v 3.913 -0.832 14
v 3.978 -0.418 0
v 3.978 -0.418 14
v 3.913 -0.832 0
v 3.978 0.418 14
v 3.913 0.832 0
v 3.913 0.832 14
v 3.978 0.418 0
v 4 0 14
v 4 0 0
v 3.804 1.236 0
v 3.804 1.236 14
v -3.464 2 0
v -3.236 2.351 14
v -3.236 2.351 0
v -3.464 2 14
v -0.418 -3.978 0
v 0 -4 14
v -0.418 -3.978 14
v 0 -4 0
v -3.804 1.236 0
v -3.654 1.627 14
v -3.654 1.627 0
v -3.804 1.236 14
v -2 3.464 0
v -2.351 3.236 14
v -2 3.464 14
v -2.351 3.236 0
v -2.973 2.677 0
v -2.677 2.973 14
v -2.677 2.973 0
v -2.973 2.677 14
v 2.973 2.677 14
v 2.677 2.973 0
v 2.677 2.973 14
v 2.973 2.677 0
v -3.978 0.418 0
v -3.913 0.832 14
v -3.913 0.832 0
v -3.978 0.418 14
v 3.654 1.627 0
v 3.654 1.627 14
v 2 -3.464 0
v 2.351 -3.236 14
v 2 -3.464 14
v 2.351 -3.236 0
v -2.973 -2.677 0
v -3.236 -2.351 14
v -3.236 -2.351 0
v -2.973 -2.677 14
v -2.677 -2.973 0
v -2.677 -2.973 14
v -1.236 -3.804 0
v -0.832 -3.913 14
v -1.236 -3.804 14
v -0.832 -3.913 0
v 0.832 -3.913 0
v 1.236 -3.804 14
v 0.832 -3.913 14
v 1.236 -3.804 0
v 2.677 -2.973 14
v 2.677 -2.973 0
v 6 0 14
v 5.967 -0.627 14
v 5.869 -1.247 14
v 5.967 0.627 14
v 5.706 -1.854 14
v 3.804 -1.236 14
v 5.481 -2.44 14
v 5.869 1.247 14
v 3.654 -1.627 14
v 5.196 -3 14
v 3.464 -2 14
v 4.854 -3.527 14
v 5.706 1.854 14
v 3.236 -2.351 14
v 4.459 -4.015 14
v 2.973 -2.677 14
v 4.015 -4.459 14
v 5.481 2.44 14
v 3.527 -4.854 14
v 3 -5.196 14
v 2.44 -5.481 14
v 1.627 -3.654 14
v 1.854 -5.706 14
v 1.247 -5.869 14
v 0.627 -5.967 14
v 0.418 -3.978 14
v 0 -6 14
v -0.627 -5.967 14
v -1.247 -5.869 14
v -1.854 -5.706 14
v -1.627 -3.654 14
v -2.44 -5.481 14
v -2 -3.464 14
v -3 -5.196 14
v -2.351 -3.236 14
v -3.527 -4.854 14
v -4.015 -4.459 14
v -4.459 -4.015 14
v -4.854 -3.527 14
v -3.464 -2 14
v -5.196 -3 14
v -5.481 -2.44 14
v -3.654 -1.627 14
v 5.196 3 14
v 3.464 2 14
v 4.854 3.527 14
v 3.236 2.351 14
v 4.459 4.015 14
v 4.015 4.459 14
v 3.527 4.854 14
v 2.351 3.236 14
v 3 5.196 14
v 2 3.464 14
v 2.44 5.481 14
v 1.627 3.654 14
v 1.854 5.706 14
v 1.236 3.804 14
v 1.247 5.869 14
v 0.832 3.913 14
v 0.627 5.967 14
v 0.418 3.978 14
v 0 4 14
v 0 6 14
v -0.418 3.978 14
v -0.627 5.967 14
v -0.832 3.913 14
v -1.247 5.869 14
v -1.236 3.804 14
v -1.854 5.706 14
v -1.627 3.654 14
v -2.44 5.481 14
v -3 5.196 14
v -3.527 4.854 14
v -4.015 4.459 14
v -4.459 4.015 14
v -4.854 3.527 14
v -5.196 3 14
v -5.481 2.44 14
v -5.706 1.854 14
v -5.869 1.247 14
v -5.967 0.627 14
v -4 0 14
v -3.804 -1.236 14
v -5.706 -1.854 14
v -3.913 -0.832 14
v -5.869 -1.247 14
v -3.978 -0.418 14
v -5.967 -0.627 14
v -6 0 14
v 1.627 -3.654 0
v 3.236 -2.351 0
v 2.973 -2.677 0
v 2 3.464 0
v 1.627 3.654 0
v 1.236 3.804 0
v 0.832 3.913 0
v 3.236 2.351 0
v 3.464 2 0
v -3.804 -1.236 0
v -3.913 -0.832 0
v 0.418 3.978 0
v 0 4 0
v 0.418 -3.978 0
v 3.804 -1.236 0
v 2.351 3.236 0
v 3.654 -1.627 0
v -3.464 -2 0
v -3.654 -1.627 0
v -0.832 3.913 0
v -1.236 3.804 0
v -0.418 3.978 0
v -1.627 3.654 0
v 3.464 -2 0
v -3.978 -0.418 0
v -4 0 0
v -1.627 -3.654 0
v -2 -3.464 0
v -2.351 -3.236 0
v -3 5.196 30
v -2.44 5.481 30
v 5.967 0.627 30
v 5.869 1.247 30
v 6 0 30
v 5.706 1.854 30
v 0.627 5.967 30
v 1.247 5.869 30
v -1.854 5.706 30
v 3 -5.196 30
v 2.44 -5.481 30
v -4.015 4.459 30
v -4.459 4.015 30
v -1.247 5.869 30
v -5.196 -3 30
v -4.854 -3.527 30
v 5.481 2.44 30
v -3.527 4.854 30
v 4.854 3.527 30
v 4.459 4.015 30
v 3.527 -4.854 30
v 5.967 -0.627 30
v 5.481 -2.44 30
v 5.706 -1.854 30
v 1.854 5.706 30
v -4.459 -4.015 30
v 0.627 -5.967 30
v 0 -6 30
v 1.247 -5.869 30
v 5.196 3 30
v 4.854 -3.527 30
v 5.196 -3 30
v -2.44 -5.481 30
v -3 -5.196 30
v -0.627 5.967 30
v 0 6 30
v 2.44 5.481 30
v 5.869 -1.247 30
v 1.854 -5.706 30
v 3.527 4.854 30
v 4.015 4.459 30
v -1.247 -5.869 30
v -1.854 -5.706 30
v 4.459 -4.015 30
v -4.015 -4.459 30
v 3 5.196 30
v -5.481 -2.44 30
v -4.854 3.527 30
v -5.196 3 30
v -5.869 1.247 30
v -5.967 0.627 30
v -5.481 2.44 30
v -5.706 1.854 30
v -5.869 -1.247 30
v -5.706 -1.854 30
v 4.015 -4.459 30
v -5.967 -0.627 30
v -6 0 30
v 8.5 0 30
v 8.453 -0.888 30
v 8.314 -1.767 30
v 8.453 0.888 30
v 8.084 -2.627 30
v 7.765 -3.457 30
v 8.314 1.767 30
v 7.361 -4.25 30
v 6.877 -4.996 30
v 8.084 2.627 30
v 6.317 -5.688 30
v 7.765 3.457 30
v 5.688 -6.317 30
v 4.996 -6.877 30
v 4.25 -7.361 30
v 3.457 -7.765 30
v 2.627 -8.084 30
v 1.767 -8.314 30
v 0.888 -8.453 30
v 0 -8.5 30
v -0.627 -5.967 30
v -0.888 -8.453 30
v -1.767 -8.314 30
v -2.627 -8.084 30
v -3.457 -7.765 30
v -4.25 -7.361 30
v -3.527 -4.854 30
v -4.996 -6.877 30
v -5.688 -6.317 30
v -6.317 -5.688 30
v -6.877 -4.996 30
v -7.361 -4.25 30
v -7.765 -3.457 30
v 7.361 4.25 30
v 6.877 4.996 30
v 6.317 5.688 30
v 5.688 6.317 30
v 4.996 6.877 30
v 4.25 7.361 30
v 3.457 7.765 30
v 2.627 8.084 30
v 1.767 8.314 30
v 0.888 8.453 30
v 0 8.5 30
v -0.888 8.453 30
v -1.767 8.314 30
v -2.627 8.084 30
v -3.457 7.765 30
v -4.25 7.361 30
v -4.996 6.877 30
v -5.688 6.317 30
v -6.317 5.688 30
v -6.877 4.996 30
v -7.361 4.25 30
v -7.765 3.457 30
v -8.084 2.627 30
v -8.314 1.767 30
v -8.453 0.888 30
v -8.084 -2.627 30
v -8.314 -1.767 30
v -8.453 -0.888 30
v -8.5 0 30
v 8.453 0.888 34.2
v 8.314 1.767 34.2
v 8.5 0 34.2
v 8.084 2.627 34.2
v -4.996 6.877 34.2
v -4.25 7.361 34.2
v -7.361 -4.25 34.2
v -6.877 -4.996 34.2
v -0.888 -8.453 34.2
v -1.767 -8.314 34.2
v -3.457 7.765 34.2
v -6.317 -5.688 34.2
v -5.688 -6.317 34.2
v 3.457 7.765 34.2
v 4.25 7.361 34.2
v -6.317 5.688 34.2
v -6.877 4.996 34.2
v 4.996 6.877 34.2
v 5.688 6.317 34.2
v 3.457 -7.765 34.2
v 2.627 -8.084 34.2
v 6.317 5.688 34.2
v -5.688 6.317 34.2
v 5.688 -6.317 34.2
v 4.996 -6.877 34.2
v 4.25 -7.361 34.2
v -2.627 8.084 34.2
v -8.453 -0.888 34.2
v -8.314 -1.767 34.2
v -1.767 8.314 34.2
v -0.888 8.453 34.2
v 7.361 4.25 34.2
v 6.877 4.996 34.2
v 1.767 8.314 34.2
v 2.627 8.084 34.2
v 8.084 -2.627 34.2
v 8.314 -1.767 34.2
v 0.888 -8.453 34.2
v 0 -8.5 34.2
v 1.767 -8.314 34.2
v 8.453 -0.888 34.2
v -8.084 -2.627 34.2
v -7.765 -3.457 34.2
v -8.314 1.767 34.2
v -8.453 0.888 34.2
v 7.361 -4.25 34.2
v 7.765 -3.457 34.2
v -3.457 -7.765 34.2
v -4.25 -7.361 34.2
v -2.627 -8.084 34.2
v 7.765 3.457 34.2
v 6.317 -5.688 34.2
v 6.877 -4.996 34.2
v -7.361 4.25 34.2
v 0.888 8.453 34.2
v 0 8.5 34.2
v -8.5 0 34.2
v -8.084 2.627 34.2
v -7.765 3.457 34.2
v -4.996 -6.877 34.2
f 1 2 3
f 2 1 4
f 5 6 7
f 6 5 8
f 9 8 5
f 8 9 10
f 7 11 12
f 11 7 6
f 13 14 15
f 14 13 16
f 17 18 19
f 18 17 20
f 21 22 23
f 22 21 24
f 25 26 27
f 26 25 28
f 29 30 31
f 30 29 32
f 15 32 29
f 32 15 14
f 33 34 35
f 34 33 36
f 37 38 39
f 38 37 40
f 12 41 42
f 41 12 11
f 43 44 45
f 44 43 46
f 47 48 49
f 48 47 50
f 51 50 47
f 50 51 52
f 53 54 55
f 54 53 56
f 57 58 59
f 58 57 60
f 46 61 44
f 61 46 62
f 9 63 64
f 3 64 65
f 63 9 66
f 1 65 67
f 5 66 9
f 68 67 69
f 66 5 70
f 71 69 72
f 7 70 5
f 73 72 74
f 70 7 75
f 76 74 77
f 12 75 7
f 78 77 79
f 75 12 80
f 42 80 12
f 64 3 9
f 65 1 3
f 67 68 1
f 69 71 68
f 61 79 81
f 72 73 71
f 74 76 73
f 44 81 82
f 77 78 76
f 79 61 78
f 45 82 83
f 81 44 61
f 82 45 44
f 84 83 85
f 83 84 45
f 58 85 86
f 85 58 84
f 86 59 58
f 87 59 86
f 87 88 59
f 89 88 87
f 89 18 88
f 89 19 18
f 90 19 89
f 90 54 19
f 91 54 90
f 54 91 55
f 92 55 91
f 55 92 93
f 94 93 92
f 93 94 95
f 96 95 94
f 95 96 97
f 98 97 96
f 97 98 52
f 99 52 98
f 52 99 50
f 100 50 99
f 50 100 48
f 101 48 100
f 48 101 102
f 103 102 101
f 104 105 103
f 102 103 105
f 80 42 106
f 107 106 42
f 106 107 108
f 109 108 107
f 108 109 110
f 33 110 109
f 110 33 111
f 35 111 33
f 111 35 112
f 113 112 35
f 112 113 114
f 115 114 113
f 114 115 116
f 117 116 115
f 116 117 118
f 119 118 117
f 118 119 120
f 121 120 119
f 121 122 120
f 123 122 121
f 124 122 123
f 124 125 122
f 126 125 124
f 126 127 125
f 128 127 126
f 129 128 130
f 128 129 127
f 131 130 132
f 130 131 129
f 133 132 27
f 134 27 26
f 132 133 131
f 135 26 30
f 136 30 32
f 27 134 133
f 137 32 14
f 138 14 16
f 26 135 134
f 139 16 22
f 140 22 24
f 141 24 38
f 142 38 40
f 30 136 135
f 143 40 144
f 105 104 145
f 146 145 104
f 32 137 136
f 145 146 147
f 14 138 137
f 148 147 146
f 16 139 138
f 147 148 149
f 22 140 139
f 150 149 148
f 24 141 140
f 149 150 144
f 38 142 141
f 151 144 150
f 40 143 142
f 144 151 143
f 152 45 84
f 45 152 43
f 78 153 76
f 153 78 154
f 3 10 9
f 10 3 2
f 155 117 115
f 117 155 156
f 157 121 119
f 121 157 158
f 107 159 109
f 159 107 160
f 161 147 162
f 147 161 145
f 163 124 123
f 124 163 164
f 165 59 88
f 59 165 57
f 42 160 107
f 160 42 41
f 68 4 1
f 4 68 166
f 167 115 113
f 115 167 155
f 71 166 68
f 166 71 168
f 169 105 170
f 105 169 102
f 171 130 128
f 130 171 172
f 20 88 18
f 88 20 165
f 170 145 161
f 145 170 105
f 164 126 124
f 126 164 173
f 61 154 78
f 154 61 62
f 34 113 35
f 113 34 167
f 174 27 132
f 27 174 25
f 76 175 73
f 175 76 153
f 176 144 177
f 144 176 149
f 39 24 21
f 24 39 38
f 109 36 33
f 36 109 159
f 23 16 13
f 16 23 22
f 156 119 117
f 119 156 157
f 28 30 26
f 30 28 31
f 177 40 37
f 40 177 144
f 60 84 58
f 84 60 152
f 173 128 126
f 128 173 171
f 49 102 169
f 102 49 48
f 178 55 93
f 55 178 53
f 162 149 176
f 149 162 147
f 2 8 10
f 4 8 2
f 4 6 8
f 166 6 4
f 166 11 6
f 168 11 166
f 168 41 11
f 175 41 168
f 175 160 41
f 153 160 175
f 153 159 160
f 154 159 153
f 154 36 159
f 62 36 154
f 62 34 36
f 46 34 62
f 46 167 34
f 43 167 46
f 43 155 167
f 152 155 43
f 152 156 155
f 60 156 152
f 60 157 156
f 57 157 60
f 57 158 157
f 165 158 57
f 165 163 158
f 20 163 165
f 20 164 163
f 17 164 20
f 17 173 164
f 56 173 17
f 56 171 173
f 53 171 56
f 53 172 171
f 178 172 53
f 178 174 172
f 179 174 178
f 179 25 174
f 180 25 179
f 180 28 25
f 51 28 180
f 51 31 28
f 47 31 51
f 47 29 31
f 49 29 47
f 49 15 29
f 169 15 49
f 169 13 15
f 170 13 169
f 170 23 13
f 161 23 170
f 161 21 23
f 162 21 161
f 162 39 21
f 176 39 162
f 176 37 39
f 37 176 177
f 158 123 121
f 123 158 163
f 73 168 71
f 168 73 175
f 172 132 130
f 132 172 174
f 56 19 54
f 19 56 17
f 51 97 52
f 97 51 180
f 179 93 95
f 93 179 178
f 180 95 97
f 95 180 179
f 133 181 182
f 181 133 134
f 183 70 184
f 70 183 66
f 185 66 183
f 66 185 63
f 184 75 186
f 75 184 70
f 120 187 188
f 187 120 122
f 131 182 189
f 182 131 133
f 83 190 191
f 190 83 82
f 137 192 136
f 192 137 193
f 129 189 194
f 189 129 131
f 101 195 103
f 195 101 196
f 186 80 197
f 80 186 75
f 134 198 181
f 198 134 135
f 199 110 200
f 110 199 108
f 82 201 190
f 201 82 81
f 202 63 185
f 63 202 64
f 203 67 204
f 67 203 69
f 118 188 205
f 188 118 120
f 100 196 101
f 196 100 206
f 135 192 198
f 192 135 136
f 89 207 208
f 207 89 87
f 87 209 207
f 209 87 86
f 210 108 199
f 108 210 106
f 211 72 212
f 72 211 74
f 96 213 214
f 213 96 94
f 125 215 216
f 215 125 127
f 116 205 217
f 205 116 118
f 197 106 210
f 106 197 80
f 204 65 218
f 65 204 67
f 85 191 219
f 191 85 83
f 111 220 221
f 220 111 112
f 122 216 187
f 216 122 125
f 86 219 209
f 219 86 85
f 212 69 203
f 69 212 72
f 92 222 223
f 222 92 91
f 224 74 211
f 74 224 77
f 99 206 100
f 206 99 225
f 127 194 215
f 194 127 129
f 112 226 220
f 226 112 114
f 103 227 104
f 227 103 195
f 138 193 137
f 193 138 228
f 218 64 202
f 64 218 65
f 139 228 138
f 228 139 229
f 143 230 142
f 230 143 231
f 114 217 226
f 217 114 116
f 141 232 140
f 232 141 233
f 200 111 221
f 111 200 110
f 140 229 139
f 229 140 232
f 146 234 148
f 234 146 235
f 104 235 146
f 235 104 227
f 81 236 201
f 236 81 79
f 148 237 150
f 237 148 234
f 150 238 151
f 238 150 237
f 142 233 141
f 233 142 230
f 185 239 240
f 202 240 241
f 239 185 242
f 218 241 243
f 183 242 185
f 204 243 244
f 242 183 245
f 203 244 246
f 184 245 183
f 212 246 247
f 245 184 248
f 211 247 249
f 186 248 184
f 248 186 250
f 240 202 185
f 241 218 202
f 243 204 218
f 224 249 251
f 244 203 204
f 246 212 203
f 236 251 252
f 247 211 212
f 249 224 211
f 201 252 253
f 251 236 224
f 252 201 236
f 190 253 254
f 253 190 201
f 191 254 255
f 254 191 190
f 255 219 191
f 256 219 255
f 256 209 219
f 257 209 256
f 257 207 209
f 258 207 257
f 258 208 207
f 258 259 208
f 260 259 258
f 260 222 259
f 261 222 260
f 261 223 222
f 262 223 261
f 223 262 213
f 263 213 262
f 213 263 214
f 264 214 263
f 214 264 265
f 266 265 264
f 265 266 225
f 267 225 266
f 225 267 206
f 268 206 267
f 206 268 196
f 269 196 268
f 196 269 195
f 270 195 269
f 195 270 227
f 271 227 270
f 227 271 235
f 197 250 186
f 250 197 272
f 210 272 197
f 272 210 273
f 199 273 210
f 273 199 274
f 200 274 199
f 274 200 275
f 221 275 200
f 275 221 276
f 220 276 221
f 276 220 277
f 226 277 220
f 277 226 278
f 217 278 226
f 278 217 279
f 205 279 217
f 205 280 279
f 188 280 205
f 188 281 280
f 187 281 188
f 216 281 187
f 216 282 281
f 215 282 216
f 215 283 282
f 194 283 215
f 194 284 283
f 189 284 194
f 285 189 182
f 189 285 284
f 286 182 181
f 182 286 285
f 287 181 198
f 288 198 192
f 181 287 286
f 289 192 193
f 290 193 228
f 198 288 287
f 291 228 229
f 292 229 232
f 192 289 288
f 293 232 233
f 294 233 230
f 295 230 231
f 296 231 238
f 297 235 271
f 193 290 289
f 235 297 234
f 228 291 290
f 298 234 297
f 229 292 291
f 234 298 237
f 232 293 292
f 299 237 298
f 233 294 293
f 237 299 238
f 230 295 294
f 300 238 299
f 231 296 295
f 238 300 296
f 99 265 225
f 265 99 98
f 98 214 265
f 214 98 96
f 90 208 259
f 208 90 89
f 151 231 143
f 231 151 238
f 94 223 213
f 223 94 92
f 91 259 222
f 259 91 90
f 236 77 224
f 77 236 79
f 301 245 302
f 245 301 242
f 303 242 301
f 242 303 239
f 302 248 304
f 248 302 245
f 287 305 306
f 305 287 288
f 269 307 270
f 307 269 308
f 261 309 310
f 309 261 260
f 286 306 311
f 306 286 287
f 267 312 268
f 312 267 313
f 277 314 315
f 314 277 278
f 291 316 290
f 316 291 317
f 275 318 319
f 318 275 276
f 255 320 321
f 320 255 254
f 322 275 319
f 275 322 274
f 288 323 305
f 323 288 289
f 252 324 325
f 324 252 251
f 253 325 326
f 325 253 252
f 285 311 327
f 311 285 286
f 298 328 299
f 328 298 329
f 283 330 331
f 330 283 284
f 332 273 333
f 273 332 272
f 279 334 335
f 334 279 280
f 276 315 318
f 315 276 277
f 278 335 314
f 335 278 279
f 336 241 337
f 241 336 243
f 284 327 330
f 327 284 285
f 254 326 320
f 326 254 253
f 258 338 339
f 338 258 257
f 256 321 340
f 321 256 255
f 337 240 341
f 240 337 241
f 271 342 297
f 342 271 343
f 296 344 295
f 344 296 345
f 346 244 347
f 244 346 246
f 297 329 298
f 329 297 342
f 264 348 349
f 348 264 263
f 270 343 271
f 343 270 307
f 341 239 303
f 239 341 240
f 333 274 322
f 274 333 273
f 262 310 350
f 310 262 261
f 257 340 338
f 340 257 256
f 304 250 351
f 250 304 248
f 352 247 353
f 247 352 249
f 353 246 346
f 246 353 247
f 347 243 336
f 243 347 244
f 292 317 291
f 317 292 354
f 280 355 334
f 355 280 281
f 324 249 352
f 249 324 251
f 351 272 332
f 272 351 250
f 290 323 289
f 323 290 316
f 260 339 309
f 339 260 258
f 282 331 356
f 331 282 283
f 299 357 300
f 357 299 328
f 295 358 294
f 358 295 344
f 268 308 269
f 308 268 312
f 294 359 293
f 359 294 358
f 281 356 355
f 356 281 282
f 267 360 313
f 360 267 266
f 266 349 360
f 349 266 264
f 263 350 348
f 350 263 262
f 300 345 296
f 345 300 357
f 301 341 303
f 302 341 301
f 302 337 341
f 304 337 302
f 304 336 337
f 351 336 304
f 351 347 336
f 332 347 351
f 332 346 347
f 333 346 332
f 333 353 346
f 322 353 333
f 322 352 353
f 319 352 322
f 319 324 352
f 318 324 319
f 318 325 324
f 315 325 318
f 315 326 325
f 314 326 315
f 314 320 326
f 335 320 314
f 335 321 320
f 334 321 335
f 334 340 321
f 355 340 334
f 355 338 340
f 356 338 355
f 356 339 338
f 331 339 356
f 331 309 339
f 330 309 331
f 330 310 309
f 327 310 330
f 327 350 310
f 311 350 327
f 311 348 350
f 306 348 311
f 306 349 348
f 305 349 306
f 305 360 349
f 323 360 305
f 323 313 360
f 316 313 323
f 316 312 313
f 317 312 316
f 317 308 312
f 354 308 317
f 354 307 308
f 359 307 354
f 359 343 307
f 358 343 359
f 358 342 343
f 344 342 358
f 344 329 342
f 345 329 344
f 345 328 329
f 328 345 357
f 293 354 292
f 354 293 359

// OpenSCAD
// Shoulder bolt.
$fn = 60;
eps = 0.02;
thread_d = 8;
shoulder_d = 12;
shoulder_l = 16;
thread_l = 14;
head_d = shoulder_d + 5;
union() {
    cylinder(d=thread_d,h=thread_l);
    translate([0,0,thread_l]) cylinder(d=shoulder_d,h=shoulder_l);
    translate([0,0,thread_l+shoulder_l]) cylinder(d=head_d,h=shoulder_d*0.35);
}
